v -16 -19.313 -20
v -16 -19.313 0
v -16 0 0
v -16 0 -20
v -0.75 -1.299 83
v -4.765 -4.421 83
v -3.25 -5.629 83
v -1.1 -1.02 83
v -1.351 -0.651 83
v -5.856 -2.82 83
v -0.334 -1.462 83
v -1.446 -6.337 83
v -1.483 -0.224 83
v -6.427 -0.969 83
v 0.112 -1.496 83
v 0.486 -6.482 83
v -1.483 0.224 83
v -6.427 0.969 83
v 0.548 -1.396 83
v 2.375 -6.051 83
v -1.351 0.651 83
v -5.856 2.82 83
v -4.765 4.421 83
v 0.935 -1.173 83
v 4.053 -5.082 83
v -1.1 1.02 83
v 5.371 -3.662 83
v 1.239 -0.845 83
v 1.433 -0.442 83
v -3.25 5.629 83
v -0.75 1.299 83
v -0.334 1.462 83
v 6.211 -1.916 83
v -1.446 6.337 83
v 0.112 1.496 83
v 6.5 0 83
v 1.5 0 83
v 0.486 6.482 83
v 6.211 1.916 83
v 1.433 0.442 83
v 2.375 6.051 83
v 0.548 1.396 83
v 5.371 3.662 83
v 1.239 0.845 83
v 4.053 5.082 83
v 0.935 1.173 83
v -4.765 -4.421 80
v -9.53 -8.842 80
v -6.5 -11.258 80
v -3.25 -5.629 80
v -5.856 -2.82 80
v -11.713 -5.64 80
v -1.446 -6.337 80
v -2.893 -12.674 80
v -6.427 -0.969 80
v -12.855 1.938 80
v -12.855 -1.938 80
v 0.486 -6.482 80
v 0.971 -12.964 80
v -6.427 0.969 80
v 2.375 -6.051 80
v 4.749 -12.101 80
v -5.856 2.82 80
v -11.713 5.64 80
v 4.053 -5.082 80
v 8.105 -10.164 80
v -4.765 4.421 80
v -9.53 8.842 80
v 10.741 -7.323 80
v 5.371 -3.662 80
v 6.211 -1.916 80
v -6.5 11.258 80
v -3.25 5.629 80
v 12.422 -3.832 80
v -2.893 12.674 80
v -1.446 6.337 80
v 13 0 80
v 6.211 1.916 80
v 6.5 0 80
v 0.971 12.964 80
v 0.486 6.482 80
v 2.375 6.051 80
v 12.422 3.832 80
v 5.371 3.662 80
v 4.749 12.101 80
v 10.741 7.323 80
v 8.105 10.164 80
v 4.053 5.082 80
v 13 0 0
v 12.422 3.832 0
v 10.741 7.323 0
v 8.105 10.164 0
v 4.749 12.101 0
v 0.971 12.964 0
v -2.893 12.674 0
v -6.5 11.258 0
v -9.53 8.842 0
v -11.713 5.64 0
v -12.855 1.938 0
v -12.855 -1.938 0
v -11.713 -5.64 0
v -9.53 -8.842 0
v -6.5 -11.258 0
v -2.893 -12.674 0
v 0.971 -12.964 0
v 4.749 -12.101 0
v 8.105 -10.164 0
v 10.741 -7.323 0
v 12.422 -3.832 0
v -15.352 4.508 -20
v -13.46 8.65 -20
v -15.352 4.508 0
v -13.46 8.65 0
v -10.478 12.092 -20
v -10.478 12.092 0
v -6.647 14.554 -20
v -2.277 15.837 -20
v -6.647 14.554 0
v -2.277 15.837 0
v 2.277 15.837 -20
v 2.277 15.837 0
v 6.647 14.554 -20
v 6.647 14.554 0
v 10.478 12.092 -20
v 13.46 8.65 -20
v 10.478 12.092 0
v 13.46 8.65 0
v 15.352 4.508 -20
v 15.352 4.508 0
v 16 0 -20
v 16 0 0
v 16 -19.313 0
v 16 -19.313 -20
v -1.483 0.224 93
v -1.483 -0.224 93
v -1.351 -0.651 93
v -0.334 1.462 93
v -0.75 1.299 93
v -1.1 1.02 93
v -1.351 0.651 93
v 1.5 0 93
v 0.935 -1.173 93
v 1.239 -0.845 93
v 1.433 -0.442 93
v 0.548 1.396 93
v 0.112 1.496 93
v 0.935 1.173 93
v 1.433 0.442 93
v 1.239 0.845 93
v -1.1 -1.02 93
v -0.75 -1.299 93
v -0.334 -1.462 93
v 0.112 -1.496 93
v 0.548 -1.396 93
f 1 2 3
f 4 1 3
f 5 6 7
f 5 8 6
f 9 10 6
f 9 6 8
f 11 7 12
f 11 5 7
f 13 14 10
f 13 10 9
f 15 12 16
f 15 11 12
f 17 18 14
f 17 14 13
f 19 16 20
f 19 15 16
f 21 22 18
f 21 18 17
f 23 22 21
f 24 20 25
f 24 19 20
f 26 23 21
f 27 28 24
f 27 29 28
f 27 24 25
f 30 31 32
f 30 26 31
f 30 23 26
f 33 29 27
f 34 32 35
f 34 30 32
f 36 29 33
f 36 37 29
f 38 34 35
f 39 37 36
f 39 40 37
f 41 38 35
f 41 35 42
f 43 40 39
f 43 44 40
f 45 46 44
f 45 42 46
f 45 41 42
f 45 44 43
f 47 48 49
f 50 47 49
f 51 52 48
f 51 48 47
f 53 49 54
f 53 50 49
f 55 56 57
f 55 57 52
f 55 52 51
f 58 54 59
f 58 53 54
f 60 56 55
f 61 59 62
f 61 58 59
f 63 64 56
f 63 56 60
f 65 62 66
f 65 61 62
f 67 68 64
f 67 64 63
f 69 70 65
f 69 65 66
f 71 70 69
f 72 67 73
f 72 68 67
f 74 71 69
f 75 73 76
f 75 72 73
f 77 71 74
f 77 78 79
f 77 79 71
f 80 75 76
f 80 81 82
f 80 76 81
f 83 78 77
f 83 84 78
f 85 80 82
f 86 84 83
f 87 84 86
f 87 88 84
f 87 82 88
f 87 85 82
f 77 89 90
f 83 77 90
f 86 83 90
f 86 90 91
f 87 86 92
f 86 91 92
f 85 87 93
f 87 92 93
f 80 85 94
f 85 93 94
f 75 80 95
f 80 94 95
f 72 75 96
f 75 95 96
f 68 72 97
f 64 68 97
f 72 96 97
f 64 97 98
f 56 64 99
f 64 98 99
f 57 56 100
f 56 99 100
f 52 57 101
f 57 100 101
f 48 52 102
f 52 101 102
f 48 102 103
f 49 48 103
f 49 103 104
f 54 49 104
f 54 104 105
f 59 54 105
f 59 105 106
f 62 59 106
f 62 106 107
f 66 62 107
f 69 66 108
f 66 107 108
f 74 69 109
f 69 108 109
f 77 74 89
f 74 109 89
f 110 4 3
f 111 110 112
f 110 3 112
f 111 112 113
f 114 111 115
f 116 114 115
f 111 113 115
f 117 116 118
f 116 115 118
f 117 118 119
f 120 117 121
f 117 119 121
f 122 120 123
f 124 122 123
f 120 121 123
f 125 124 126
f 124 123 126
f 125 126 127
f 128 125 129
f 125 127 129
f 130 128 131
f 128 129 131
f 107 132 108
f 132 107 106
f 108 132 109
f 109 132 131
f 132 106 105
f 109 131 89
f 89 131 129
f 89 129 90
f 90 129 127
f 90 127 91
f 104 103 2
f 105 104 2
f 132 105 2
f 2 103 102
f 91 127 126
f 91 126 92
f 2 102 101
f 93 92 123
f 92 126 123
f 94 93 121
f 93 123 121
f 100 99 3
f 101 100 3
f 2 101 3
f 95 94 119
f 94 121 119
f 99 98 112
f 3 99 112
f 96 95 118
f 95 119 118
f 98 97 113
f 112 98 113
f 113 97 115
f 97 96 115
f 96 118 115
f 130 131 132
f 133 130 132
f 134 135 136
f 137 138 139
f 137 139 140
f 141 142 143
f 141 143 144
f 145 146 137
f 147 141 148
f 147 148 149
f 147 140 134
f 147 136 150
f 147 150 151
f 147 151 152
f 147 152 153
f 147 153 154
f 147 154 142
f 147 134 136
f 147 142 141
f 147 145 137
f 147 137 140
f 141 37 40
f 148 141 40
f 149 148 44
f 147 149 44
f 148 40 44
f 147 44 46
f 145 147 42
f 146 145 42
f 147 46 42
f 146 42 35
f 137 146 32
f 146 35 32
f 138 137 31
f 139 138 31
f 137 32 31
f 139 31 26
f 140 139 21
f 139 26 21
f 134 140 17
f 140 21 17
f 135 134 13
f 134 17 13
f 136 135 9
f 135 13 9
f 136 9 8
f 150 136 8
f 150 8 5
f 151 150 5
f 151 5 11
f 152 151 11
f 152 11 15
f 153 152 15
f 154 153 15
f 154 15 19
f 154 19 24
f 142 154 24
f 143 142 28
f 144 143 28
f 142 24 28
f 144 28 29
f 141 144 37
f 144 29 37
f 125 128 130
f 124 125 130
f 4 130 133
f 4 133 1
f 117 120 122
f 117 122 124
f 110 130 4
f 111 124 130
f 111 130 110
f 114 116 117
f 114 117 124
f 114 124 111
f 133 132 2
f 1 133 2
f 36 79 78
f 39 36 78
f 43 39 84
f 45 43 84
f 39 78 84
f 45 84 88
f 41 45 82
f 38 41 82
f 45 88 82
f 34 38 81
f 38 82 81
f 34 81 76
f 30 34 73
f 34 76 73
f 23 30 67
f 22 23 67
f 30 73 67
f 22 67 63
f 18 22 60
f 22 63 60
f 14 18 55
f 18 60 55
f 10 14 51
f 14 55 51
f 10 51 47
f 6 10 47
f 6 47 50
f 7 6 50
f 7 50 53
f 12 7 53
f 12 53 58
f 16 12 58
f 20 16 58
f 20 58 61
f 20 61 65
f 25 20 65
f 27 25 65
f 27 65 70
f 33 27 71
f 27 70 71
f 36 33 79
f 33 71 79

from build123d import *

# Parameters (mm, degrees)
ESQUISSE1_R      = 13
EXTRUSION1_DEPTH = 80
ESQUISSE2_R      = 6.5
EXTRUSION2_DEPTH = 3
ESQUISSE3_R      = 1.5
EXTRUSION3_DEPTH = 10
EXTRUSION5_DEPTH = 20


with BuildPart() as part:
    # Esquisse1 → Extrusion1 (new body)
    with BuildSketch(Plane.XY):
        Circle(ESQUISSE1_R)
    extrude(amount=EXTRUSION1_DEPTH)

    # Esquisse2 → Extrusion2 (add)
    with BuildSketch(Plane.XY.offset(80)):
        Circle(ESQUISSE2_R)
    extrude(amount=EXTRUSION2_DEPTH)

    # Esquisse3 → Extrusion3 (add)
    with BuildSketch(Plane.XY.offset(83)):
        Circle(ESQUISSE3_R)
    extrude(amount=EXTRUSION3_DEPTH)

    # Esquisse4 → Extrusion5 (add)
    with BuildSketch(Plane(origin=(0, 0, 0), x_dir=(-1, 0, 0), z_dir=(0, 0, -1))):
        with BuildLine():
            Line((-16, 0), (-16, -19.313261222))
            Line((-16, -19.313261222), (16, -19.313261222))
            Line((16, -19.313261222), (16, 0))
            ThreePointArc((16, 0), (0, 16), (-16, 0))
        make_face()
    extrude(amount=EXTRUSION5_DEPTH)


solid = part.part
